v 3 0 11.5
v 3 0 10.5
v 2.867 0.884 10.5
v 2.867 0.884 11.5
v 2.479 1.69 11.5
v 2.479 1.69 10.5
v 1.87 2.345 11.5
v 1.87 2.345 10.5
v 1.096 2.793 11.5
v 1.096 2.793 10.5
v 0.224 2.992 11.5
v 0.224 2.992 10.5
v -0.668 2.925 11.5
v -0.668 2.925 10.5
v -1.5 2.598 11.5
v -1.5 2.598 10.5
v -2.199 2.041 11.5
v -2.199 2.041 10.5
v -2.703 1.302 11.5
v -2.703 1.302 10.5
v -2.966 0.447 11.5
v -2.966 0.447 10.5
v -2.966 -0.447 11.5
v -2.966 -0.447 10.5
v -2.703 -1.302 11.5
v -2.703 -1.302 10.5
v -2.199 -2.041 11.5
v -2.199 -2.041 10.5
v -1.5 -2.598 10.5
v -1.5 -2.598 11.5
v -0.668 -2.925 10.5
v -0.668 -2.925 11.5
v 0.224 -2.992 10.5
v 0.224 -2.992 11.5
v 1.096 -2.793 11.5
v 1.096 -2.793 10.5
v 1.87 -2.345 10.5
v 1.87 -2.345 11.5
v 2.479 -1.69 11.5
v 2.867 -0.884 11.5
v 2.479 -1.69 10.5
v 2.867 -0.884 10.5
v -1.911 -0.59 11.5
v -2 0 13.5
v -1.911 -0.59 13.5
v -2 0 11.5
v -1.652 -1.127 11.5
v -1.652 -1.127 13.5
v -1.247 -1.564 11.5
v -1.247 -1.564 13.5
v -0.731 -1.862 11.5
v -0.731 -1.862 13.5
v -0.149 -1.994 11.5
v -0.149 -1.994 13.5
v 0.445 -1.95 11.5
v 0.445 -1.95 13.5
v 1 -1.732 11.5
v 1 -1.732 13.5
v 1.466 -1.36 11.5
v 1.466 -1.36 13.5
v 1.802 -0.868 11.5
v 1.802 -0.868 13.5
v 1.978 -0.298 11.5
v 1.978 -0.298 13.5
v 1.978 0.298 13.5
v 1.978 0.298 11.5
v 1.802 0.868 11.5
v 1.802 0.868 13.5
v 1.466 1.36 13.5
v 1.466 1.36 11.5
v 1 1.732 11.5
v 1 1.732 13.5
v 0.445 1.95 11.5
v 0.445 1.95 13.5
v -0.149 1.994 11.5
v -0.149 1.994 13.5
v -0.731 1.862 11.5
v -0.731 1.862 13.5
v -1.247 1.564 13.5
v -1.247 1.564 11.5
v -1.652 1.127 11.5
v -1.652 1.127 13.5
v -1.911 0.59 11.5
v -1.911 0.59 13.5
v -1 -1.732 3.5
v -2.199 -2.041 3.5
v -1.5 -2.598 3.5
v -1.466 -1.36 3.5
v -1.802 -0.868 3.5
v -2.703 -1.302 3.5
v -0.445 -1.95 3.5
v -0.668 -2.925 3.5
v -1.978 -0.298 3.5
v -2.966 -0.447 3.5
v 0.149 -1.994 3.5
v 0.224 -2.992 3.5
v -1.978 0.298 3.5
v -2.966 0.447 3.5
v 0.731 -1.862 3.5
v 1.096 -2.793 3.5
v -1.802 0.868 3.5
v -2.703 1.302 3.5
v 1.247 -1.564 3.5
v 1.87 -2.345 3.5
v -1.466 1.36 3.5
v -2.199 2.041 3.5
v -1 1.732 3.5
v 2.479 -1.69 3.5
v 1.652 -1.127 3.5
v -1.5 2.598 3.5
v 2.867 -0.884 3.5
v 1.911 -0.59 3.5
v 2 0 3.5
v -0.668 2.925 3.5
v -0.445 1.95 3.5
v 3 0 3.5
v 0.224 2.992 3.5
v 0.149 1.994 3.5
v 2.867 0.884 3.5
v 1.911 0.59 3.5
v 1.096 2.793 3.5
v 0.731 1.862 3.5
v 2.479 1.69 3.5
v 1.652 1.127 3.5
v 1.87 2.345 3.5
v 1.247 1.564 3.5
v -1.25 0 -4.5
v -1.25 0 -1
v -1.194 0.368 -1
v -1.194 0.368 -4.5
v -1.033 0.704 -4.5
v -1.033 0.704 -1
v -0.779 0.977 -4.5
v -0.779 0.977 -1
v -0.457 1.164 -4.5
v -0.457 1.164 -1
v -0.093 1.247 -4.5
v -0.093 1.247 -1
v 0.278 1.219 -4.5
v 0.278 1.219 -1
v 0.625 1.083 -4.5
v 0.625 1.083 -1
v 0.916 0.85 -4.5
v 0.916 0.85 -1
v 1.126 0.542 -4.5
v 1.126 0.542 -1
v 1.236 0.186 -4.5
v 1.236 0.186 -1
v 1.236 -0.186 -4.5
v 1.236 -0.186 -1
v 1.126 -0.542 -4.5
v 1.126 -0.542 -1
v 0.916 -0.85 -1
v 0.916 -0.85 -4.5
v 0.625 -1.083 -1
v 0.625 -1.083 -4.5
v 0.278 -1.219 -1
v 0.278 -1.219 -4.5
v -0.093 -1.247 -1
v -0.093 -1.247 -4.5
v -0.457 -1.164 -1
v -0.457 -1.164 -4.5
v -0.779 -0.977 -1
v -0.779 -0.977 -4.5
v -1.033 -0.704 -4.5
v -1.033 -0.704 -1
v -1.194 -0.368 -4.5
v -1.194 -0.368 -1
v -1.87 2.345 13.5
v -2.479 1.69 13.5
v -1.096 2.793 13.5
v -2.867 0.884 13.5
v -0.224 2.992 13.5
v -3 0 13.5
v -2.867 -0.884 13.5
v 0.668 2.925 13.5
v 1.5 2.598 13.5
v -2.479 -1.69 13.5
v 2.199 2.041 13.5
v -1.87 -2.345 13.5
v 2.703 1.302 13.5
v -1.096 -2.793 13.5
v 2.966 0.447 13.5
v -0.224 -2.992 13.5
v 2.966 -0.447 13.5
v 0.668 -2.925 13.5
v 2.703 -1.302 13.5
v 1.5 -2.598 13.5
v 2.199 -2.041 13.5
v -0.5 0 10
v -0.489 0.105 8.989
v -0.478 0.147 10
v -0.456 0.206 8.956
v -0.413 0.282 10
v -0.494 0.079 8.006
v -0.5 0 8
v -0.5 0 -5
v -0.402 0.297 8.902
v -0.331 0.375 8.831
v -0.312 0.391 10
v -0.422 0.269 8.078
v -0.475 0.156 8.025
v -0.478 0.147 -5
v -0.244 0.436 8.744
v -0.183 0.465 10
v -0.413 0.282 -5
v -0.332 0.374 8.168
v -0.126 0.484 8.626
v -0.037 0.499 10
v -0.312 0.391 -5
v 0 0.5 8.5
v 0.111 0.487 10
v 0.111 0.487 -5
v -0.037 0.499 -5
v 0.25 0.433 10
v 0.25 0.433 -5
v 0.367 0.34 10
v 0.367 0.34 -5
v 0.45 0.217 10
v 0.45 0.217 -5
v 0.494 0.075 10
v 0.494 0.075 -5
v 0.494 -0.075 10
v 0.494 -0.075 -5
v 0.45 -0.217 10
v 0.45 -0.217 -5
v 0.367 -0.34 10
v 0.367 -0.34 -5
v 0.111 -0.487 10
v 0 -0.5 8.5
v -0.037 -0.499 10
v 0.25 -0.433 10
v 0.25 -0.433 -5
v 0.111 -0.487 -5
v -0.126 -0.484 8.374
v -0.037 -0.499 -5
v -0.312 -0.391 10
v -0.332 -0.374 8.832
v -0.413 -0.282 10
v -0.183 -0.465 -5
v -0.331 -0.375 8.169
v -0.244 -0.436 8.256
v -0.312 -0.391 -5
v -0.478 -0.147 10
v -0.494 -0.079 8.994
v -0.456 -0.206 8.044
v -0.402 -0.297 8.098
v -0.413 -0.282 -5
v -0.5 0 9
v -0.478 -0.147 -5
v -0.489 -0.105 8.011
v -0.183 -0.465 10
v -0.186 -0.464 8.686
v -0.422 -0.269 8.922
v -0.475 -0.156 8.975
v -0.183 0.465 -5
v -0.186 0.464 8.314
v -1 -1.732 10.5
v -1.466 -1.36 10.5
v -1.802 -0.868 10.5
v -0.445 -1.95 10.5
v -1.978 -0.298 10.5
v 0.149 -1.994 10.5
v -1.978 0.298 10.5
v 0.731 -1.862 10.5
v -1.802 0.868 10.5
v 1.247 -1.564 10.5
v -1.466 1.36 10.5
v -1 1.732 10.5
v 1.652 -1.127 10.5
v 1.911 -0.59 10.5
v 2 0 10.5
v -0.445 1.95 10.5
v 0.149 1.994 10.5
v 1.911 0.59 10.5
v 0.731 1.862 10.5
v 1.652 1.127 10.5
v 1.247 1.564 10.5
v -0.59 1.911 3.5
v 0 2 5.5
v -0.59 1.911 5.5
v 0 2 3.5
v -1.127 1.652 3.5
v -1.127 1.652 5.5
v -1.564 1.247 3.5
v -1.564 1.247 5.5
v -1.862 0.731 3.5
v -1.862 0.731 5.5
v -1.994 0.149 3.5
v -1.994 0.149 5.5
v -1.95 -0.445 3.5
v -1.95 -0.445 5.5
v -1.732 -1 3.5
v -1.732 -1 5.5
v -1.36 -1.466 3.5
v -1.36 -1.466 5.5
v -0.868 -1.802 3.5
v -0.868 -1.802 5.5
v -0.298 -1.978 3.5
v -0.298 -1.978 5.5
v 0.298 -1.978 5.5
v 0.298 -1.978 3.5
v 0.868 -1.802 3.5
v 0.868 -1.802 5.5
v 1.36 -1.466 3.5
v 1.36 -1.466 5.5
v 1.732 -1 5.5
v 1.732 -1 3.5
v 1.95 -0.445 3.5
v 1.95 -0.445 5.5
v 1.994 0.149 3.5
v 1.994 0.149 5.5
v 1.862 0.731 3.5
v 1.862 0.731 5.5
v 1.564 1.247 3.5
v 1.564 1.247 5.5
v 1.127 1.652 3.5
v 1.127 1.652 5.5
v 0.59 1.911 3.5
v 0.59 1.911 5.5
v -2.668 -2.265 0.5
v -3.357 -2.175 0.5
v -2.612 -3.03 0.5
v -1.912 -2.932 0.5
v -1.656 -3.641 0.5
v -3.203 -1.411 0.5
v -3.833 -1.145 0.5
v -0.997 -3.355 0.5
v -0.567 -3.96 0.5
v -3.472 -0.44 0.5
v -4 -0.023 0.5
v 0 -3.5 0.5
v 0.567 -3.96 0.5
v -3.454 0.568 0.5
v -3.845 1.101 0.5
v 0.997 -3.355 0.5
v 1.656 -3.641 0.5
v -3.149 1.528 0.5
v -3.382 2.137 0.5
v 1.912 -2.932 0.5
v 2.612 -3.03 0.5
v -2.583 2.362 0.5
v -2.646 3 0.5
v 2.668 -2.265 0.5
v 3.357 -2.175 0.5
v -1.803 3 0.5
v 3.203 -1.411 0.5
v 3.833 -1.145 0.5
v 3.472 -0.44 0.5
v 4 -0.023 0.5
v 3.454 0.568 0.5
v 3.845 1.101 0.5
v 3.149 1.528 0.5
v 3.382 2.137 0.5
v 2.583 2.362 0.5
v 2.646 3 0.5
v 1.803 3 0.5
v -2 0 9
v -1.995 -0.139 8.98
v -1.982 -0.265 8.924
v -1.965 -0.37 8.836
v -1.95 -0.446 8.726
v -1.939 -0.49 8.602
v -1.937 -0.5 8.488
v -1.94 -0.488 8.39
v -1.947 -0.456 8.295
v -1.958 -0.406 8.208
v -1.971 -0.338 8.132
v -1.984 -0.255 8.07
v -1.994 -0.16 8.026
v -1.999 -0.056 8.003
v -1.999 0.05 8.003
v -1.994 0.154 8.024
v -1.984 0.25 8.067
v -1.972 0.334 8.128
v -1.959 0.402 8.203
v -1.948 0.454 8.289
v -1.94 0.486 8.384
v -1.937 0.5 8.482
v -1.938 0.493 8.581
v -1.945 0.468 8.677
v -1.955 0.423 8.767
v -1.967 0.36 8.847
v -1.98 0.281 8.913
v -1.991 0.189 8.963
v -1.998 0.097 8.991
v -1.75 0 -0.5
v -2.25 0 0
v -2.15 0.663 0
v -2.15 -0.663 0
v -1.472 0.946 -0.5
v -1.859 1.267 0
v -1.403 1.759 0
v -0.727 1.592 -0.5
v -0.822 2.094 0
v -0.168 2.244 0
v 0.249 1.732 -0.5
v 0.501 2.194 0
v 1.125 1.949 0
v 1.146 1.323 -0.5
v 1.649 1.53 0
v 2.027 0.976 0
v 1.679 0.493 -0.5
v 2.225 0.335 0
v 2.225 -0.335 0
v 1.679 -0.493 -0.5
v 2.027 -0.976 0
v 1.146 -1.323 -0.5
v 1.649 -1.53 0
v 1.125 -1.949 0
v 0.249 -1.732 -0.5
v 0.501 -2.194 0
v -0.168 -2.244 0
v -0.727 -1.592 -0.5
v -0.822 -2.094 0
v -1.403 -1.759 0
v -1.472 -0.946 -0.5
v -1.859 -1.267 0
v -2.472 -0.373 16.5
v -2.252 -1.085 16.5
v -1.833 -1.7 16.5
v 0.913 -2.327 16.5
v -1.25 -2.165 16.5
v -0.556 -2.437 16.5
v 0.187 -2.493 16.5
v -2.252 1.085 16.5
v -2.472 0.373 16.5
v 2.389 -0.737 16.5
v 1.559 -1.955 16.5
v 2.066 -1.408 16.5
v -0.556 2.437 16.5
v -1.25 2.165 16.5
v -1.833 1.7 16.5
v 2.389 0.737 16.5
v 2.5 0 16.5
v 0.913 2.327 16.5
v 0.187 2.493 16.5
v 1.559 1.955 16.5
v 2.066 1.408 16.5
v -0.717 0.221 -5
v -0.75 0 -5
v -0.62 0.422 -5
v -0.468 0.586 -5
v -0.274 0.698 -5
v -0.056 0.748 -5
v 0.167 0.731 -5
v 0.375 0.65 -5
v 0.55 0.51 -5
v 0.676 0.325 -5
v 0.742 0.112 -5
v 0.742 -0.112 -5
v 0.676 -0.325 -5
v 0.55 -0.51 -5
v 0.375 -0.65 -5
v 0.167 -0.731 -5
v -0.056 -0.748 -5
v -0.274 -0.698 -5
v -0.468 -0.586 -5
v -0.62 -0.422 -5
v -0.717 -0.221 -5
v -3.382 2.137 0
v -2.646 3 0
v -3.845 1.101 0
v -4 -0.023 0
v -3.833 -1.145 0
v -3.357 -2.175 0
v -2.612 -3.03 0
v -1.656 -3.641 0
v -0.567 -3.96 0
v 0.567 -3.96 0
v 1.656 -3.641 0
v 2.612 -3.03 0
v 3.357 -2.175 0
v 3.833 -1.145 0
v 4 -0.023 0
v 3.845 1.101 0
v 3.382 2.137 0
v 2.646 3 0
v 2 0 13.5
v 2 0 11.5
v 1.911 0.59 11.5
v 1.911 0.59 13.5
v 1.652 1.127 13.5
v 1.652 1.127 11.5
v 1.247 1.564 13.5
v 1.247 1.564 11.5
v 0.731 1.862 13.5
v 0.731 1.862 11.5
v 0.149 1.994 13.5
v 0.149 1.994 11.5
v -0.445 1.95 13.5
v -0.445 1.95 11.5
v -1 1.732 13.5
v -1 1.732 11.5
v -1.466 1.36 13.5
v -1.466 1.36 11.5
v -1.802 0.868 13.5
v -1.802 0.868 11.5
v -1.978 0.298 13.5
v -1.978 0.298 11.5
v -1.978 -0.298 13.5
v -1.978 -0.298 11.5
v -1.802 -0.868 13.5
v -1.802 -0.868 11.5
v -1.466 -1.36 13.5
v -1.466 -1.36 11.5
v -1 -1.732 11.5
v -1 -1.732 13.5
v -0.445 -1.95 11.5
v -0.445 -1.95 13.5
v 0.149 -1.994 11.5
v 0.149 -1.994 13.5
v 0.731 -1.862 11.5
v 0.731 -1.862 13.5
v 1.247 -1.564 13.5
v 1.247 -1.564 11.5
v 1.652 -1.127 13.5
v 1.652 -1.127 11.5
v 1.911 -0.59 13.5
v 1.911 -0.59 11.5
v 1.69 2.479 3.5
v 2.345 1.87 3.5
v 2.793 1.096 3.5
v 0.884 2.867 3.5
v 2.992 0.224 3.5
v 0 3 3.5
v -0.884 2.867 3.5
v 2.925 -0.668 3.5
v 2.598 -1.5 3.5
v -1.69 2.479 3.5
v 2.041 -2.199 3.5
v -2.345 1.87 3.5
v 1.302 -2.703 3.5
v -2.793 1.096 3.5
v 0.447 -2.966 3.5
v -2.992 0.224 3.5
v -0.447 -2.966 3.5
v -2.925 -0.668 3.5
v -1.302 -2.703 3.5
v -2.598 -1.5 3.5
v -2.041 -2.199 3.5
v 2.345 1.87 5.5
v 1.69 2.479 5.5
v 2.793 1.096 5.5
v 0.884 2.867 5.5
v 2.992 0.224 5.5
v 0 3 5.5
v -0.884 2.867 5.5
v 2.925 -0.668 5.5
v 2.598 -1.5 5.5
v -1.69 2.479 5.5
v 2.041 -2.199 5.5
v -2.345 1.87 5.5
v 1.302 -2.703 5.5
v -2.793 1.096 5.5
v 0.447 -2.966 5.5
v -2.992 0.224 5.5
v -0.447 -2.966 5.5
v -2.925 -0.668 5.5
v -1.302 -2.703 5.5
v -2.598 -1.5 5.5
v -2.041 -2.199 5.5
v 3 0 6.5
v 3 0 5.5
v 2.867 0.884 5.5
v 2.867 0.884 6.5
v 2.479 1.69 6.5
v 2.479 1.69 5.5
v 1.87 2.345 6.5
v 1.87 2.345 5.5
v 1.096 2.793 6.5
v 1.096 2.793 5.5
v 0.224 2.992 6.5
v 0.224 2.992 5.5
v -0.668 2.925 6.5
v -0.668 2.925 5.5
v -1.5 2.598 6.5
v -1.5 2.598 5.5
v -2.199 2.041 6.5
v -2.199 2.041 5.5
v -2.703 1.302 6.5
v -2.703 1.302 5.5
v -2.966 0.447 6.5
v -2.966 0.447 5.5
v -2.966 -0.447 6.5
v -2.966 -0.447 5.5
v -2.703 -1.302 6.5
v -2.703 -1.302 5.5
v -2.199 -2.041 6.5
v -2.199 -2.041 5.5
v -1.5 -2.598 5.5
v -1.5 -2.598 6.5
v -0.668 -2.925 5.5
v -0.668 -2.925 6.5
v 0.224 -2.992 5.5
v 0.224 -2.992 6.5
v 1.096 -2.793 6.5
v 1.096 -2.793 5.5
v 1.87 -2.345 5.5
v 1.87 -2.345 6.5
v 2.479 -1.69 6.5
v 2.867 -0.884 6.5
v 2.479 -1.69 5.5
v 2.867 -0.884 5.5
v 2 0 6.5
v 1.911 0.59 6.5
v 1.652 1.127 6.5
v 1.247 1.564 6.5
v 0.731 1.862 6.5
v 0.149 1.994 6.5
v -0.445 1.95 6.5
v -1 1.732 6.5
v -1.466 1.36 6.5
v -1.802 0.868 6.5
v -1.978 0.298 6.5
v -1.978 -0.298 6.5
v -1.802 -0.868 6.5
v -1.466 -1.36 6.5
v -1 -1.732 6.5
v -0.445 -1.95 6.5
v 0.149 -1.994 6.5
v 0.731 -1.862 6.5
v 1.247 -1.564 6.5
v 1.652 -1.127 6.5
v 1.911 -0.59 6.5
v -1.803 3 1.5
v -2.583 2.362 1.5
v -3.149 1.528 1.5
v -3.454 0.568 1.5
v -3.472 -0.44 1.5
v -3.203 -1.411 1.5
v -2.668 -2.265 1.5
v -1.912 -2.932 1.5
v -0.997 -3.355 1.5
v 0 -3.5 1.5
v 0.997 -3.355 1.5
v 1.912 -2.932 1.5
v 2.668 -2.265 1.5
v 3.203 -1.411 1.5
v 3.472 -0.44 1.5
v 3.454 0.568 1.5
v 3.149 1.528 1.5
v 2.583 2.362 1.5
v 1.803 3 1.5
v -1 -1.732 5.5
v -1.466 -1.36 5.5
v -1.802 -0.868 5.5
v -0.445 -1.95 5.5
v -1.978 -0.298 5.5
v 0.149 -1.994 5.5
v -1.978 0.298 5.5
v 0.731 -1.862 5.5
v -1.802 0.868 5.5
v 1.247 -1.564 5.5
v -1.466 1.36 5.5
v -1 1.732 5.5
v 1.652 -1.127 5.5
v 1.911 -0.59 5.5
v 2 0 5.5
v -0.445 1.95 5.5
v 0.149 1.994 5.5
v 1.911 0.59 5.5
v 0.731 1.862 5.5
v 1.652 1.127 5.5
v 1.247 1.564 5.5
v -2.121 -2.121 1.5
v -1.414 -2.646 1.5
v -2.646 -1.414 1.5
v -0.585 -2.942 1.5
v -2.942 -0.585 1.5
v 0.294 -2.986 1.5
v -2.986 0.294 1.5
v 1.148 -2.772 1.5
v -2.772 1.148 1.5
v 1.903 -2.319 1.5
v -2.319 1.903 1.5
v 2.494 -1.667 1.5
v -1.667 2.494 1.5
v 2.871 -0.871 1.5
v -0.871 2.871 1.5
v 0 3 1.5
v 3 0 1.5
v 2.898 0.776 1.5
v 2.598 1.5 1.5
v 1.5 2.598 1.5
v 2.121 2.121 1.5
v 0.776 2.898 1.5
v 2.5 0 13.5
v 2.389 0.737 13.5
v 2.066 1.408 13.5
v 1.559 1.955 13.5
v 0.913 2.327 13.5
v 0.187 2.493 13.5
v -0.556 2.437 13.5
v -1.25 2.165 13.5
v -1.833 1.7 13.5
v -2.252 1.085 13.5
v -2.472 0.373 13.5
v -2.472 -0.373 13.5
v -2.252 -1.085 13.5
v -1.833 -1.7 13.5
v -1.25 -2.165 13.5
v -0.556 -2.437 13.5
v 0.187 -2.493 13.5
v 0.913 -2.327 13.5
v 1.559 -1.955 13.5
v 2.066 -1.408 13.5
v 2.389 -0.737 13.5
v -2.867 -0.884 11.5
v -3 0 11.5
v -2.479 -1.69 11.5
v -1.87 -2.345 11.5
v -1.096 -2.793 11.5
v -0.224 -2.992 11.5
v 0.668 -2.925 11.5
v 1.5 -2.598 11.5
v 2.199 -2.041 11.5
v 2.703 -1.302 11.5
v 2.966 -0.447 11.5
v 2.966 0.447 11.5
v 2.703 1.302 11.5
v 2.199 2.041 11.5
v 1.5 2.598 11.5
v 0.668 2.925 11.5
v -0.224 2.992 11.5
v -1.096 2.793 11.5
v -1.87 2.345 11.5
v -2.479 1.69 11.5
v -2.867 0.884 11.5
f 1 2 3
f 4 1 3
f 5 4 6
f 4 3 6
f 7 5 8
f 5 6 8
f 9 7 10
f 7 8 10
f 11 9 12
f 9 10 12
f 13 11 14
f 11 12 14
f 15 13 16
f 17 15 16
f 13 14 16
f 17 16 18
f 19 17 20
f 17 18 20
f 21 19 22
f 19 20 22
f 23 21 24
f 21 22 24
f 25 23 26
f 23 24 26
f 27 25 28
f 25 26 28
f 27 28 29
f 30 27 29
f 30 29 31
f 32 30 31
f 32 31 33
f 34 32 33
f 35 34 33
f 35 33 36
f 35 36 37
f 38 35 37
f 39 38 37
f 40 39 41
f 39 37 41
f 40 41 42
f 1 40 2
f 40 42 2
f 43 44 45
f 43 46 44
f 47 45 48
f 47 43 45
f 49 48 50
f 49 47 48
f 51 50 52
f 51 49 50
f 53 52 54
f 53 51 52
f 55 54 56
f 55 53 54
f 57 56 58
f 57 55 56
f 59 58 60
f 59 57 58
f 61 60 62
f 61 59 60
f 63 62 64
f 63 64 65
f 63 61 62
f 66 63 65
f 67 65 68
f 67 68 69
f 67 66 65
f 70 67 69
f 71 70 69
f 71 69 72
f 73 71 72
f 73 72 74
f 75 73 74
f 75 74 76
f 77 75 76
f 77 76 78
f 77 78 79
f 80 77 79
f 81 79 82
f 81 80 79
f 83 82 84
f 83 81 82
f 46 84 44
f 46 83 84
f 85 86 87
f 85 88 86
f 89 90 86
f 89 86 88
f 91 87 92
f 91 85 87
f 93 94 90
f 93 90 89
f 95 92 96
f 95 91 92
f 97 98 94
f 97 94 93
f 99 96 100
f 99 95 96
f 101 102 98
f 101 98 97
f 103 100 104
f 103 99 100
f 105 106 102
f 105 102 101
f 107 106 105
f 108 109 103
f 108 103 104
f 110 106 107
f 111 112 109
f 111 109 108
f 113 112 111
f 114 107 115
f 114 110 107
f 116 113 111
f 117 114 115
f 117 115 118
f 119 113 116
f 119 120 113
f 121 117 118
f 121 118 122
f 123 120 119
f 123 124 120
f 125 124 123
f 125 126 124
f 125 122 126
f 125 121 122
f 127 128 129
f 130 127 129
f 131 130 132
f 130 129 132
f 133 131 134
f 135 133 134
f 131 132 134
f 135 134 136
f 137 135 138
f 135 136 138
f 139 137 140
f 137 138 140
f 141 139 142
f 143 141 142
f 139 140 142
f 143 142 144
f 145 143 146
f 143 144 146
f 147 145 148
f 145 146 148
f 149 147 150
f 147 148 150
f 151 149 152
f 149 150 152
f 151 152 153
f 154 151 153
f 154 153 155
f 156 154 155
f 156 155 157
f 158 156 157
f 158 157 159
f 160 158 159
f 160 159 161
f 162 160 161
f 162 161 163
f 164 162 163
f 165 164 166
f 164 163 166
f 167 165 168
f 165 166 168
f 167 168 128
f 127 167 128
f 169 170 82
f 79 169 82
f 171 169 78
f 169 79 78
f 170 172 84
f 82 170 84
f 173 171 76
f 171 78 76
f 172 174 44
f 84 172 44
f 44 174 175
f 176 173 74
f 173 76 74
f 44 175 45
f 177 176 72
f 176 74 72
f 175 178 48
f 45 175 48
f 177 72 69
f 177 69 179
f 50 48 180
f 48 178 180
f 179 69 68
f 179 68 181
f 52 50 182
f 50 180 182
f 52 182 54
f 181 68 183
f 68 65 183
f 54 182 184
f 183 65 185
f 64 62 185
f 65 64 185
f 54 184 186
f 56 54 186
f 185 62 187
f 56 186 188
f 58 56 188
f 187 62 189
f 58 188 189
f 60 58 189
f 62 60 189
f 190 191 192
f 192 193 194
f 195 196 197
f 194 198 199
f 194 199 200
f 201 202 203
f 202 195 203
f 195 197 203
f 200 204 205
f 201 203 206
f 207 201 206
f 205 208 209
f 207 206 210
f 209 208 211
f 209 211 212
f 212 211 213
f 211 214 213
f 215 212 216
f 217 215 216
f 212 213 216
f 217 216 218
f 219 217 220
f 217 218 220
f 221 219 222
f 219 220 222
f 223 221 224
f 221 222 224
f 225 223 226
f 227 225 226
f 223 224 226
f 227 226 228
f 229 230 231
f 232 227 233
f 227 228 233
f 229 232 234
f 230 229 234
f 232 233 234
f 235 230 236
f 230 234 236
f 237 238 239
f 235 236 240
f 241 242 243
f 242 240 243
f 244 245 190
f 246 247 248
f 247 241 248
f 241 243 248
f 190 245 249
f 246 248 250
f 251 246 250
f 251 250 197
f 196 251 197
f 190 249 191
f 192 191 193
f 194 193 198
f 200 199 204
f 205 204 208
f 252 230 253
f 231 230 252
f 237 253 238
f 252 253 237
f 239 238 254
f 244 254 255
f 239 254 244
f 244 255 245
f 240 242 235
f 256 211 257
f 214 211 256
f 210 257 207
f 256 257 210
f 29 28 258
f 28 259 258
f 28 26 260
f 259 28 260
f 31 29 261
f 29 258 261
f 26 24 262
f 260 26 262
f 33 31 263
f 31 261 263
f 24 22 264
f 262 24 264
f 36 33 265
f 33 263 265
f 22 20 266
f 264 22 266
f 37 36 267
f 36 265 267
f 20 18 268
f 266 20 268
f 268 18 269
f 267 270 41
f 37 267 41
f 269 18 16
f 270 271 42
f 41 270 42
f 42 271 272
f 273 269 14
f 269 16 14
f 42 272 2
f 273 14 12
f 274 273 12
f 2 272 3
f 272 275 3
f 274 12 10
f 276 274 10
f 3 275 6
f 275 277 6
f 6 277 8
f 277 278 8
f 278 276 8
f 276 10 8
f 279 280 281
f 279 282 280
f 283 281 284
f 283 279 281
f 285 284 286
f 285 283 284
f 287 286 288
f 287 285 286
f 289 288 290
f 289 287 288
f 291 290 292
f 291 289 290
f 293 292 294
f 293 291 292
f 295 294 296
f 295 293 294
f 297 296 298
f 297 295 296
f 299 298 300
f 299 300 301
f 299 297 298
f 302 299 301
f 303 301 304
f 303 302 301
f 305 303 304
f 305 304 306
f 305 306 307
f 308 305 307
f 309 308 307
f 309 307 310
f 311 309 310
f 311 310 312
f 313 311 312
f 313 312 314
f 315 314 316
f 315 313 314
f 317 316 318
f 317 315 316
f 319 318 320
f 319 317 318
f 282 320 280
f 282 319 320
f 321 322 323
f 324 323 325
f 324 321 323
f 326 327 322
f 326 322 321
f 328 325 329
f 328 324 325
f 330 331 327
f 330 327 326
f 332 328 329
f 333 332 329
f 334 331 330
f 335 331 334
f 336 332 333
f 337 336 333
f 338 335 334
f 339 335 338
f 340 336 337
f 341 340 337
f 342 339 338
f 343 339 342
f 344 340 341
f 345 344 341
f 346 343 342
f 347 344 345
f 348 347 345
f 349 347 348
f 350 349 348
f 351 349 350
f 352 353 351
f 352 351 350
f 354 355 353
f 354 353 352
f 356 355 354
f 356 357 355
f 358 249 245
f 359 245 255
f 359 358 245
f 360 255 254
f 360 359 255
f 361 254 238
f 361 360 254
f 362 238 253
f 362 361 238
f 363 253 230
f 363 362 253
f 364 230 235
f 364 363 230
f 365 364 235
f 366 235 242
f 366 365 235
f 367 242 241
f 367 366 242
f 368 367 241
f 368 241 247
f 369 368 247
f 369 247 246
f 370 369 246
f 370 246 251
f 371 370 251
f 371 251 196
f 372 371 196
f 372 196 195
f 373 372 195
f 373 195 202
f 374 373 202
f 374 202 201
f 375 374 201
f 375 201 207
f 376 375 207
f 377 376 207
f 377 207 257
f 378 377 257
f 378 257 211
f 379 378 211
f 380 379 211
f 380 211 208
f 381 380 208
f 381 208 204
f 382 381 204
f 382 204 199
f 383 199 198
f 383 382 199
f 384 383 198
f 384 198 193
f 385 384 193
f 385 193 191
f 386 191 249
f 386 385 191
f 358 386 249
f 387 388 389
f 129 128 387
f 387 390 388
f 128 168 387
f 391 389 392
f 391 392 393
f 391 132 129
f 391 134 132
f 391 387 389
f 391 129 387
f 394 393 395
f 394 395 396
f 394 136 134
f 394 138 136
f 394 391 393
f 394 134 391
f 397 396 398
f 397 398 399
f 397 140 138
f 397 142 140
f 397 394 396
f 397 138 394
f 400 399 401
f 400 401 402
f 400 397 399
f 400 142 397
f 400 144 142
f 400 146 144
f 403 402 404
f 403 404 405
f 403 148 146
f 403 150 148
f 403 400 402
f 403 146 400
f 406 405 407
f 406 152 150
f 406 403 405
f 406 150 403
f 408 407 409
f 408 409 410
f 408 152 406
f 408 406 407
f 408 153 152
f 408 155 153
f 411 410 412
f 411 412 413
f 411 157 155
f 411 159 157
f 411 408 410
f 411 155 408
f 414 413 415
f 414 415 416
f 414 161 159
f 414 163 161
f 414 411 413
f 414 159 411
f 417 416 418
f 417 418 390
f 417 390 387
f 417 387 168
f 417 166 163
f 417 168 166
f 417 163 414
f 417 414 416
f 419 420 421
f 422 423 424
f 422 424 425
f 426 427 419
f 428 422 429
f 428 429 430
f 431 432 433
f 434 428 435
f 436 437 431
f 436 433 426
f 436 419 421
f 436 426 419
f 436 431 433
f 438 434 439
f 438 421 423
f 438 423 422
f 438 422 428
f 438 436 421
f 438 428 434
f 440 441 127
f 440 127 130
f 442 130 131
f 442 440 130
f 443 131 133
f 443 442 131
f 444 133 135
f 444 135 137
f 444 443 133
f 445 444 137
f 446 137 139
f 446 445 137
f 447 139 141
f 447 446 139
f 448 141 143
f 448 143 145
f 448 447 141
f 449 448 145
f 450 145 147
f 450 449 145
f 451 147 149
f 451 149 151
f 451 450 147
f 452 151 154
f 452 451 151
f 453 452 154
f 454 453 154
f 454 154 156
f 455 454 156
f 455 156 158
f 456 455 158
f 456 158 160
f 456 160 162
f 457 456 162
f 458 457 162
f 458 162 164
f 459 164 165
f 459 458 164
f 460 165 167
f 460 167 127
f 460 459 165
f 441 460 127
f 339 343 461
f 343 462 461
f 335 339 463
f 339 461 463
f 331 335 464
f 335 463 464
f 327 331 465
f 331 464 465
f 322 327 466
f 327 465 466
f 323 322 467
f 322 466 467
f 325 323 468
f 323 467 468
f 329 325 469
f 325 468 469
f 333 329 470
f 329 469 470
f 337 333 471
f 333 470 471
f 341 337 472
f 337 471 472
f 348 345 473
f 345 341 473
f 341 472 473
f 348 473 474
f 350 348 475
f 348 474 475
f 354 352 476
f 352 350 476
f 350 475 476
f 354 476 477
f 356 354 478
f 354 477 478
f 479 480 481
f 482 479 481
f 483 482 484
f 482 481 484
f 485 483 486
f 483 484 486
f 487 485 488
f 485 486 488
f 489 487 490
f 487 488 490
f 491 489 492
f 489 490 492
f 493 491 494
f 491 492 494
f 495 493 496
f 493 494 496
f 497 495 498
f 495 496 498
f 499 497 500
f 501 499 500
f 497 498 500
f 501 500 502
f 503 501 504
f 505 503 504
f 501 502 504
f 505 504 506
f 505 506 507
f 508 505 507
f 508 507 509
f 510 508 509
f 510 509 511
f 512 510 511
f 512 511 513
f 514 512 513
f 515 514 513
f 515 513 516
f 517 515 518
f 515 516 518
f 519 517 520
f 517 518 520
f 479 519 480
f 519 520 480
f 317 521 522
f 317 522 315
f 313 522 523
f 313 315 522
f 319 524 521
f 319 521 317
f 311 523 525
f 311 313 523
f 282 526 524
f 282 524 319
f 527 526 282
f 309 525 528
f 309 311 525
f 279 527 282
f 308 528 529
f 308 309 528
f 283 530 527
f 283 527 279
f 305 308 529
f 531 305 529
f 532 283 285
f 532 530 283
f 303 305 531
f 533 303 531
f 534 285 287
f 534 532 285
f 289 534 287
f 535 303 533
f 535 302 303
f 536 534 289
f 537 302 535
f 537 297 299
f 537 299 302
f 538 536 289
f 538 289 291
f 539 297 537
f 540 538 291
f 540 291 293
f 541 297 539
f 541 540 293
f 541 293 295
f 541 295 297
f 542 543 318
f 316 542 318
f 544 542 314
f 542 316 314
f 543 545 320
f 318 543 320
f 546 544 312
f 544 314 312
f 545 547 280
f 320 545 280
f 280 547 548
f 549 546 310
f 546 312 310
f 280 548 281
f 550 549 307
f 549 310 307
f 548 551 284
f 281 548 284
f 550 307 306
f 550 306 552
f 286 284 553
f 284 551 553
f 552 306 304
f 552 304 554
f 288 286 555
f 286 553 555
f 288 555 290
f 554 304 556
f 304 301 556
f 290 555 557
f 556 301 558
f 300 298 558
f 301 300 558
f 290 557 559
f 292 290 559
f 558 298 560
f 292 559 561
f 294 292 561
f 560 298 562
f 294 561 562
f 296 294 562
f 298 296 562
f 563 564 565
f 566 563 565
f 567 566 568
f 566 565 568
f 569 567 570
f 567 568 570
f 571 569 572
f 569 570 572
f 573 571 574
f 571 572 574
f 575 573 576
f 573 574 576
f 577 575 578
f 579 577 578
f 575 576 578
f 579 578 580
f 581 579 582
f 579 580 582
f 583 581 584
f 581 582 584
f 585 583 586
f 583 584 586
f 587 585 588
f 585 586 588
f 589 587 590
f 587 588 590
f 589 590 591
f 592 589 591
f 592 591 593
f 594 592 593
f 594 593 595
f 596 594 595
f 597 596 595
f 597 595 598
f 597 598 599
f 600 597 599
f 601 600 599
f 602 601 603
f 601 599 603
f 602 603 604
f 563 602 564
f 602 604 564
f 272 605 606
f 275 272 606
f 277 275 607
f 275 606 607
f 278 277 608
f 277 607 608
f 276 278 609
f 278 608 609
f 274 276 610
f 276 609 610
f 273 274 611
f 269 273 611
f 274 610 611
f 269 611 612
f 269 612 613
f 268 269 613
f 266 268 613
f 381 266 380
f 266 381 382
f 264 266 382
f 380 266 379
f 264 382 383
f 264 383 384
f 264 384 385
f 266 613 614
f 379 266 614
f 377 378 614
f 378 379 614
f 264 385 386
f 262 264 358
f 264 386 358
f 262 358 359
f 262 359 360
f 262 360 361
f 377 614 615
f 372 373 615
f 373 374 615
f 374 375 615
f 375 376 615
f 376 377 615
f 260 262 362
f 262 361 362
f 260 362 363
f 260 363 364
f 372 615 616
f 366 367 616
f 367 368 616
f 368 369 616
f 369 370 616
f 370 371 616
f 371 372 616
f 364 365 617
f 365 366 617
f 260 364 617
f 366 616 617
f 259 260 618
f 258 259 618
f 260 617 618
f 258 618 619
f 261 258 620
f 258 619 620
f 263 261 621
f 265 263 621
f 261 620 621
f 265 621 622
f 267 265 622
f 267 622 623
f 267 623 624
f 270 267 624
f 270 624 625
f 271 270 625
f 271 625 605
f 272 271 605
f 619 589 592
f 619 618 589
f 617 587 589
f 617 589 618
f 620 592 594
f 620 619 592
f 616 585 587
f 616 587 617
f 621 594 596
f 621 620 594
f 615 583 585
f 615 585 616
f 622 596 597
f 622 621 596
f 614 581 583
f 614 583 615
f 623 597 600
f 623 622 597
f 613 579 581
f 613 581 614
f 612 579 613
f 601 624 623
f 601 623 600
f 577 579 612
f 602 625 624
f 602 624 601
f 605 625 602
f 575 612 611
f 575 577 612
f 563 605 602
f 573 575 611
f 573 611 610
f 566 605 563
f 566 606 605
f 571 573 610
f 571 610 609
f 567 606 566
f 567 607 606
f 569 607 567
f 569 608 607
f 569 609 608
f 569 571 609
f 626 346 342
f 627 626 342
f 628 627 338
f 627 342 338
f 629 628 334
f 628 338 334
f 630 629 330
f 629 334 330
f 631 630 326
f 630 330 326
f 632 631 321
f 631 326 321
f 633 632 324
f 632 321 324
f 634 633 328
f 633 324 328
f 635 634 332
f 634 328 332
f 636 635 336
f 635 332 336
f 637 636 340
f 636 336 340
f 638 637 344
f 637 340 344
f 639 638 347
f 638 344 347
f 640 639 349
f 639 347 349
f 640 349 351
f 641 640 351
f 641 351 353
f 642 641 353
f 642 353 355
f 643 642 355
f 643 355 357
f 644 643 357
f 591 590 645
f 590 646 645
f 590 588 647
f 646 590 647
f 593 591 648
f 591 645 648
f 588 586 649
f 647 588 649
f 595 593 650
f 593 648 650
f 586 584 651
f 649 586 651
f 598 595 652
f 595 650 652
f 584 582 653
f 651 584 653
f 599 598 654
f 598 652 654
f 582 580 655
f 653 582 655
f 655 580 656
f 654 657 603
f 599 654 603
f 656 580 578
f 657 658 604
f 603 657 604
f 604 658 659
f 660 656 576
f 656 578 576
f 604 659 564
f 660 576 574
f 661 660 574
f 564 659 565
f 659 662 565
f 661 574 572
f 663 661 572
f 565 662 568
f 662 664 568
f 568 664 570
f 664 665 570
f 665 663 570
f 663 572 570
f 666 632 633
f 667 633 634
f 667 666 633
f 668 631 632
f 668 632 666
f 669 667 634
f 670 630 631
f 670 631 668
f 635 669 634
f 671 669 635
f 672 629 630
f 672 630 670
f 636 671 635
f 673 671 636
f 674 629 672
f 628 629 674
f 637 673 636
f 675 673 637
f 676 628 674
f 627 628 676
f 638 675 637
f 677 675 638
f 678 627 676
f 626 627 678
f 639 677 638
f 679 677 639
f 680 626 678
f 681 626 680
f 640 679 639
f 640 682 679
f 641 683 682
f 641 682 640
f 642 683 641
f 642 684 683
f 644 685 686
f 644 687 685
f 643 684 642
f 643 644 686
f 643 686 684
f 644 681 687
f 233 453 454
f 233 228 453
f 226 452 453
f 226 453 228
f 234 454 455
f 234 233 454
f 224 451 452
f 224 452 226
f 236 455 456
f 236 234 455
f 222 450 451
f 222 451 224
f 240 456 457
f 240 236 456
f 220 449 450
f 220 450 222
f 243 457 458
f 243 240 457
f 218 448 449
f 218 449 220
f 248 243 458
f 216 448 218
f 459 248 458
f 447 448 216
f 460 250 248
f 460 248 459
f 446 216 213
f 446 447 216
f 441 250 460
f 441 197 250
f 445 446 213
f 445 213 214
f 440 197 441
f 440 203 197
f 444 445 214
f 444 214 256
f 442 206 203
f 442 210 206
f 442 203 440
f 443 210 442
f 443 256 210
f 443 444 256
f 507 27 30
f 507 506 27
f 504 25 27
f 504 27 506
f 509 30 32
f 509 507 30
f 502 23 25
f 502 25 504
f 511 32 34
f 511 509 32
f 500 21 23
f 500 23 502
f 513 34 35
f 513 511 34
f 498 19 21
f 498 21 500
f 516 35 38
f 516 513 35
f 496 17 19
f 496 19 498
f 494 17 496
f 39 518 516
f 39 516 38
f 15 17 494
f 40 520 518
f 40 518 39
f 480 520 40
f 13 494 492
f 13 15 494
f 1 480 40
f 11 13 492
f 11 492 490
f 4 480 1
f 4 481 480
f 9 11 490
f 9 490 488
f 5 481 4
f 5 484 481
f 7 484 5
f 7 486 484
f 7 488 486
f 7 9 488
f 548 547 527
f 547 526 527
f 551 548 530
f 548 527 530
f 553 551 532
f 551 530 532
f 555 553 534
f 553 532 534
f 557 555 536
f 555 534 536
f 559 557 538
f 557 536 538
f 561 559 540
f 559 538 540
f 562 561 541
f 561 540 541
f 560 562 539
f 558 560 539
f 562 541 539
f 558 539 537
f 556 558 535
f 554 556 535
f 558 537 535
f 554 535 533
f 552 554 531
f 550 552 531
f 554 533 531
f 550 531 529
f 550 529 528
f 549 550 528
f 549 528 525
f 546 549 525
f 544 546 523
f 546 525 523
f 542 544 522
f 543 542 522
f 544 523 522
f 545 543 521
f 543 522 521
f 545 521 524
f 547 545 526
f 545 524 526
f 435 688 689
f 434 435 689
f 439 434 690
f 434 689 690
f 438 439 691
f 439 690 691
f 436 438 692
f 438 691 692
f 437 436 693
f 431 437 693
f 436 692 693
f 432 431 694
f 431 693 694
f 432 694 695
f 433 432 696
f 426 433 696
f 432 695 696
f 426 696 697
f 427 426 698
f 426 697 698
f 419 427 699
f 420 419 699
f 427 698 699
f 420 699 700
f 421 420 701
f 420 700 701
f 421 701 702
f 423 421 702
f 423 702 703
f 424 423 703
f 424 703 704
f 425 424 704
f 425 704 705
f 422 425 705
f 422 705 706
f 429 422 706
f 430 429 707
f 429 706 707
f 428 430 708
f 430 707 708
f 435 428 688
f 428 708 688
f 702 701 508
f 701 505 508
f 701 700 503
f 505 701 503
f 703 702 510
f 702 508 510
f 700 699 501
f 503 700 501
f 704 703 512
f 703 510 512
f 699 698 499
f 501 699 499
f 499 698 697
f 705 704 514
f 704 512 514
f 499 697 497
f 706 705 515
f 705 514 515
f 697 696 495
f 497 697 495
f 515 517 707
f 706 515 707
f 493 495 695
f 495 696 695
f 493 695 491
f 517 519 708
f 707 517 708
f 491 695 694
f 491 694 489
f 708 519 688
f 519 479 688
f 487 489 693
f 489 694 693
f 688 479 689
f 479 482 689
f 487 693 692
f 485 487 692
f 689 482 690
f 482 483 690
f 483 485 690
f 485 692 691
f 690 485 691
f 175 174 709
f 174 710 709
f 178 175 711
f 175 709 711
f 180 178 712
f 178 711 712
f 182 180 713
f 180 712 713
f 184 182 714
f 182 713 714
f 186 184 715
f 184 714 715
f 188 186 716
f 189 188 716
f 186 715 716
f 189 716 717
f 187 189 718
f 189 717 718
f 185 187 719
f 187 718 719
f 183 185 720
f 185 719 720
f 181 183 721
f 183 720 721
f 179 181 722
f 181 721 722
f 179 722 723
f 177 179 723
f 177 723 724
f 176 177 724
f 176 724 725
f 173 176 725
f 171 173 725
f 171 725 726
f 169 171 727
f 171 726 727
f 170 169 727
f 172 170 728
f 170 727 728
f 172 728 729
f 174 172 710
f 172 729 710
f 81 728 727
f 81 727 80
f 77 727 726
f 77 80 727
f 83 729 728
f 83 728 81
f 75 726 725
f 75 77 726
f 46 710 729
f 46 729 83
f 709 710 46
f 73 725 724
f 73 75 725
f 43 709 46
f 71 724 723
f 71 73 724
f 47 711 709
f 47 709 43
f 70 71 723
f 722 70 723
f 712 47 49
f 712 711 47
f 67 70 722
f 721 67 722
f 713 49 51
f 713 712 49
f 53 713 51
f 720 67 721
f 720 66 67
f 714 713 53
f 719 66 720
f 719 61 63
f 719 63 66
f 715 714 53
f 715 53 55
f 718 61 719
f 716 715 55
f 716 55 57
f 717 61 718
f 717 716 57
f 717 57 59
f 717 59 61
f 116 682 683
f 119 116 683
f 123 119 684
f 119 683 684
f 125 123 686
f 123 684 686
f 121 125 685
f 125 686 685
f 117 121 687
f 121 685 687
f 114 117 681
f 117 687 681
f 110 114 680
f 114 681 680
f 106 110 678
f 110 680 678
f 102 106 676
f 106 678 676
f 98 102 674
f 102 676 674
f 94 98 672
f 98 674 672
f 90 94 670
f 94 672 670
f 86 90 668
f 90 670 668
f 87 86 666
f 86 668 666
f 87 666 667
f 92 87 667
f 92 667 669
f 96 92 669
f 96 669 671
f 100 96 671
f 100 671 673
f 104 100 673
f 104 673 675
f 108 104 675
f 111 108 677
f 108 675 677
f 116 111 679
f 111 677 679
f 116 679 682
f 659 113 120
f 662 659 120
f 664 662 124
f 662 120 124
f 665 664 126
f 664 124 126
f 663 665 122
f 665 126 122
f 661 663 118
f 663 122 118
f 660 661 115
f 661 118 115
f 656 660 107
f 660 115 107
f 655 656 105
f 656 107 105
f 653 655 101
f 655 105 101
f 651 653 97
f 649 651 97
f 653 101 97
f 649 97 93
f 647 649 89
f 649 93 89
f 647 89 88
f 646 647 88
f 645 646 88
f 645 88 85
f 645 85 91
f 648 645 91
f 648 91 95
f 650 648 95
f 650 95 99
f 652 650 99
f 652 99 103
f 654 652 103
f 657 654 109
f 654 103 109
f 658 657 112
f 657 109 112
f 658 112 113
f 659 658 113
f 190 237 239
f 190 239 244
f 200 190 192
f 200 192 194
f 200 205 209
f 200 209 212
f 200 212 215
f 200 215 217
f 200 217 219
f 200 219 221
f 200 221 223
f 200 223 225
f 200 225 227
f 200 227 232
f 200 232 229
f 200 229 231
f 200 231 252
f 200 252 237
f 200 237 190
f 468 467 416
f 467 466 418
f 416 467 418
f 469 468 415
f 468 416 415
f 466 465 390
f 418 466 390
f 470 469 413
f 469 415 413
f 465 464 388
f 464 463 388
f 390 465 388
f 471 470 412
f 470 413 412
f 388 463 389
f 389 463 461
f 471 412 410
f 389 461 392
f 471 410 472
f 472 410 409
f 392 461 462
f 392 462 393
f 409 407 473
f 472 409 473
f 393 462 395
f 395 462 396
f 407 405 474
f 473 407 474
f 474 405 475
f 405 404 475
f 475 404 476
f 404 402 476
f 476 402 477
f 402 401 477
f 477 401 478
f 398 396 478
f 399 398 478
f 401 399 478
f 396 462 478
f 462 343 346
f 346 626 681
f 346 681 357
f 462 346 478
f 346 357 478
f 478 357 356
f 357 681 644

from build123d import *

# Parameters (mm, degrees)
SKETCH1_R            = 4
BOSS_EXTRUDE1_DEPTH  = 0.5
SKETCH2_R            = 3.5
BOSS_EXTRUDE2_DEPTH  = 1
SKETCH3_R            = 3
BOSS_EXTRUDE3_DEPTH  = 2
SKETCH4_R            = 2
BOSS_EXTRUDE4_DEPTH  = 2
SKETCH5_R            = 3
BOSS_EXTRUDE5_DEPTH  = 1
SKETCH6_R            = 2
BOSS_EXTRUDE6_DEPTH  = 4
SKETCH7_R            = 3
BOSS_EXTRUDE7_DEPTH  = 1
SKETCH8_R            = 2
BOSS_EXTRUDE8_DEPTH  = 2
SKETCH9_R            = 2.5
BOSS_EXTRUDE9_DEPTH  = 3
SKETCH10_R           = 1.25
BOSS_EXTRUDE10_DEPTH = 5
CHAMFER1_SIZE        = 1
CHAMFER2_SIZE        = 0.5
SKETCH11_W           = 6.076310812
SKETCH11_H           = 1
CUT_EXTRUDE1_DEPTH   = 6
SKETCH12_R           = 0.5
CUT_EXTRUDE2_DEPTH   = 2
SKETCH13_R           = 0.5
CUT_EXTRUDE3_DEPTH   = 15
SKETCH17_W           = 2
SKETCH17_H           = 1
SKETCH18_W           = 2
SKETCH18_H           = 1


with BuildPart() as part:
    # Sketch1 → Boss-Extrude1 (new body)
    with BuildSketch(Plane.XY):
        Circle(SKETCH1_R)
    extrude(amount=BOSS_EXTRUDE1_DEPTH)

    # Sketch2 → Boss-Extrude2 (add)
    with BuildSketch(Plane.XY.offset(0.5)):
        Circle(SKETCH2_R)
    extrude(amount=BOSS_EXTRUDE2_DEPTH)

    # Sketch3 → Boss-Extrude3 (add)
    with BuildSketch(Plane.XY.offset(1.5)):
        Circle(SKETCH3_R)
    extrude(amount=BOSS_EXTRUDE3_DEPTH)

    # Sketch4 → Boss-Extrude4 (add)
    with BuildSketch(Plane.XY.offset(3.5)):
        Circle(SKETCH4_R)
    extrude(amount=BOSS_EXTRUDE4_DEPTH)

    # Sketch5 → Boss-Extrude5 (add)
    with BuildSketch(Plane.XY.offset(5.5)):
        Circle(SKETCH5_R)
    extrude(amount=BOSS_EXTRUDE5_DEPTH)

    # Sketch6 → Boss-Extrude6 (add)
    with BuildSketch(Plane.XY.offset(6.5)):
        Circle(SKETCH6_R)
    extrude(amount=BOSS_EXTRUDE6_DEPTH)

    # Sketch7 → Boss-Extrude7 (add)
    with BuildSketch(Plane.XY.offset(10.5)):
        Circle(SKETCH7_R)
    extrude(amount=BOSS_EXTRUDE7_DEPTH)

    # Sketch8 → Boss-Extrude8 (add)
    with BuildSketch(Plane.XY.offset(11.5)):
        Circle(SKETCH8_R)
    extrude(amount=BOSS_EXTRUDE8_DEPTH)

    # Sketch9 → Boss-Extrude9 (add)
    with BuildSketch(Plane.XY.offset(13.5)):
        Circle(SKETCH9_R)
    extrude(amount=BOSS_EXTRUDE9_DEPTH)

    # Sketch10 → Boss-Extrude10 (add)
    with BuildSketch(Plane(origin=(0, 0, 0), x_dir=(-1, 0, 0), z_dir=(0, 0, -1))):
        Circle(SKETCH10_R)
    extrude(amount=BOSS_EXTRUDE10_DEPTH)

    # Chamfer1
    chamfer1_edges = [part.edges().sort_by_distance(p)[0] for p in [
        (1.25, 0, 0),
    ]]
    chamfer(chamfer1_edges, length=CHAMFER1_SIZE)

    # Chamfer2
    chamfer2_edges = [part.edges().sort_by_distance(p)[0] for p in [
        (1.25, 0, -5),
    ]]
    chamfer(chamfer2_edges, length=CHAMFER2_SIZE)

    # Sketch11 → Cut-Extrude1 (cut)
    with BuildSketch(Plane.XY.offset(1.5)):
        with Locations((0, 3.5)):
            Rectangle(SKETCH11_W, SKETCH11_H)
    extrude(amount=-CUT_EXTRUDE1_DEPTH, mode=Mode.SUBTRACT)

    # Sketch12 → Cut-Extrude2 (cut)
    with BuildSketch(Plane(origin=(-2, 0, 0), x_dir=(0, 0, -1), z_dir=(1, 0, 0))):
        with Locations(Location((-8.5, 0, 0), (0, 0, 180))):
            Circle(SKETCH12_R)
    extrude(amount=CUT_EXTRUDE2_DEPTH, mode=Mode.SUBTRACT)

    # Sketch13 → Cut-Extrude3 (cut)
    with BuildSketch(Plane(origin=(0, 0, -5), x_dir=(-1, 0, 0), z_dir=(0, 0, -1))):
        Circle(SKETCH13_R)
    extrude(amount=-CUT_EXTRUDE3_DEPTH, mode=Mode.SUBTRACT)


with BuildPart() as body_2:
    # Sketch17 → Revolve1 (revolve)
    with BuildSketch(Plane(origin=(0, 0, 0), x_dir=(0, 0, -1), z_dir=(1, 0, 0))):
        with Locations((-4.5, 2.5)):
            Rectangle(SKETCH17_W, SKETCH17_H)
    revolve(axis=Axis((0, 0, -2.311701569), (0, 0, 1)))


with BuildPart() as body_3:
    # Sketch18 → Revolve2 (revolve)
    with BuildSketch(Plane(origin=(0, 0, 0), x_dir=(0, 0, -1), z_dir=(1, 0, 0)), mode=Mode.PRIVATE) as revolve2_sk:
        with Locations((-12.5, 2.5)):
            Rectangle(SKETCH18_W, SKETCH18_H)
    revolve(revolve2_sk.sketch.rotate(Axis((0, 0, -0.797349903), (0, 0, 1)), 90), axis=Axis((0, 0, -0.797349903), (0, 0, 1)))


solid = Compound([part.part, body_2.part, body_3.part])
